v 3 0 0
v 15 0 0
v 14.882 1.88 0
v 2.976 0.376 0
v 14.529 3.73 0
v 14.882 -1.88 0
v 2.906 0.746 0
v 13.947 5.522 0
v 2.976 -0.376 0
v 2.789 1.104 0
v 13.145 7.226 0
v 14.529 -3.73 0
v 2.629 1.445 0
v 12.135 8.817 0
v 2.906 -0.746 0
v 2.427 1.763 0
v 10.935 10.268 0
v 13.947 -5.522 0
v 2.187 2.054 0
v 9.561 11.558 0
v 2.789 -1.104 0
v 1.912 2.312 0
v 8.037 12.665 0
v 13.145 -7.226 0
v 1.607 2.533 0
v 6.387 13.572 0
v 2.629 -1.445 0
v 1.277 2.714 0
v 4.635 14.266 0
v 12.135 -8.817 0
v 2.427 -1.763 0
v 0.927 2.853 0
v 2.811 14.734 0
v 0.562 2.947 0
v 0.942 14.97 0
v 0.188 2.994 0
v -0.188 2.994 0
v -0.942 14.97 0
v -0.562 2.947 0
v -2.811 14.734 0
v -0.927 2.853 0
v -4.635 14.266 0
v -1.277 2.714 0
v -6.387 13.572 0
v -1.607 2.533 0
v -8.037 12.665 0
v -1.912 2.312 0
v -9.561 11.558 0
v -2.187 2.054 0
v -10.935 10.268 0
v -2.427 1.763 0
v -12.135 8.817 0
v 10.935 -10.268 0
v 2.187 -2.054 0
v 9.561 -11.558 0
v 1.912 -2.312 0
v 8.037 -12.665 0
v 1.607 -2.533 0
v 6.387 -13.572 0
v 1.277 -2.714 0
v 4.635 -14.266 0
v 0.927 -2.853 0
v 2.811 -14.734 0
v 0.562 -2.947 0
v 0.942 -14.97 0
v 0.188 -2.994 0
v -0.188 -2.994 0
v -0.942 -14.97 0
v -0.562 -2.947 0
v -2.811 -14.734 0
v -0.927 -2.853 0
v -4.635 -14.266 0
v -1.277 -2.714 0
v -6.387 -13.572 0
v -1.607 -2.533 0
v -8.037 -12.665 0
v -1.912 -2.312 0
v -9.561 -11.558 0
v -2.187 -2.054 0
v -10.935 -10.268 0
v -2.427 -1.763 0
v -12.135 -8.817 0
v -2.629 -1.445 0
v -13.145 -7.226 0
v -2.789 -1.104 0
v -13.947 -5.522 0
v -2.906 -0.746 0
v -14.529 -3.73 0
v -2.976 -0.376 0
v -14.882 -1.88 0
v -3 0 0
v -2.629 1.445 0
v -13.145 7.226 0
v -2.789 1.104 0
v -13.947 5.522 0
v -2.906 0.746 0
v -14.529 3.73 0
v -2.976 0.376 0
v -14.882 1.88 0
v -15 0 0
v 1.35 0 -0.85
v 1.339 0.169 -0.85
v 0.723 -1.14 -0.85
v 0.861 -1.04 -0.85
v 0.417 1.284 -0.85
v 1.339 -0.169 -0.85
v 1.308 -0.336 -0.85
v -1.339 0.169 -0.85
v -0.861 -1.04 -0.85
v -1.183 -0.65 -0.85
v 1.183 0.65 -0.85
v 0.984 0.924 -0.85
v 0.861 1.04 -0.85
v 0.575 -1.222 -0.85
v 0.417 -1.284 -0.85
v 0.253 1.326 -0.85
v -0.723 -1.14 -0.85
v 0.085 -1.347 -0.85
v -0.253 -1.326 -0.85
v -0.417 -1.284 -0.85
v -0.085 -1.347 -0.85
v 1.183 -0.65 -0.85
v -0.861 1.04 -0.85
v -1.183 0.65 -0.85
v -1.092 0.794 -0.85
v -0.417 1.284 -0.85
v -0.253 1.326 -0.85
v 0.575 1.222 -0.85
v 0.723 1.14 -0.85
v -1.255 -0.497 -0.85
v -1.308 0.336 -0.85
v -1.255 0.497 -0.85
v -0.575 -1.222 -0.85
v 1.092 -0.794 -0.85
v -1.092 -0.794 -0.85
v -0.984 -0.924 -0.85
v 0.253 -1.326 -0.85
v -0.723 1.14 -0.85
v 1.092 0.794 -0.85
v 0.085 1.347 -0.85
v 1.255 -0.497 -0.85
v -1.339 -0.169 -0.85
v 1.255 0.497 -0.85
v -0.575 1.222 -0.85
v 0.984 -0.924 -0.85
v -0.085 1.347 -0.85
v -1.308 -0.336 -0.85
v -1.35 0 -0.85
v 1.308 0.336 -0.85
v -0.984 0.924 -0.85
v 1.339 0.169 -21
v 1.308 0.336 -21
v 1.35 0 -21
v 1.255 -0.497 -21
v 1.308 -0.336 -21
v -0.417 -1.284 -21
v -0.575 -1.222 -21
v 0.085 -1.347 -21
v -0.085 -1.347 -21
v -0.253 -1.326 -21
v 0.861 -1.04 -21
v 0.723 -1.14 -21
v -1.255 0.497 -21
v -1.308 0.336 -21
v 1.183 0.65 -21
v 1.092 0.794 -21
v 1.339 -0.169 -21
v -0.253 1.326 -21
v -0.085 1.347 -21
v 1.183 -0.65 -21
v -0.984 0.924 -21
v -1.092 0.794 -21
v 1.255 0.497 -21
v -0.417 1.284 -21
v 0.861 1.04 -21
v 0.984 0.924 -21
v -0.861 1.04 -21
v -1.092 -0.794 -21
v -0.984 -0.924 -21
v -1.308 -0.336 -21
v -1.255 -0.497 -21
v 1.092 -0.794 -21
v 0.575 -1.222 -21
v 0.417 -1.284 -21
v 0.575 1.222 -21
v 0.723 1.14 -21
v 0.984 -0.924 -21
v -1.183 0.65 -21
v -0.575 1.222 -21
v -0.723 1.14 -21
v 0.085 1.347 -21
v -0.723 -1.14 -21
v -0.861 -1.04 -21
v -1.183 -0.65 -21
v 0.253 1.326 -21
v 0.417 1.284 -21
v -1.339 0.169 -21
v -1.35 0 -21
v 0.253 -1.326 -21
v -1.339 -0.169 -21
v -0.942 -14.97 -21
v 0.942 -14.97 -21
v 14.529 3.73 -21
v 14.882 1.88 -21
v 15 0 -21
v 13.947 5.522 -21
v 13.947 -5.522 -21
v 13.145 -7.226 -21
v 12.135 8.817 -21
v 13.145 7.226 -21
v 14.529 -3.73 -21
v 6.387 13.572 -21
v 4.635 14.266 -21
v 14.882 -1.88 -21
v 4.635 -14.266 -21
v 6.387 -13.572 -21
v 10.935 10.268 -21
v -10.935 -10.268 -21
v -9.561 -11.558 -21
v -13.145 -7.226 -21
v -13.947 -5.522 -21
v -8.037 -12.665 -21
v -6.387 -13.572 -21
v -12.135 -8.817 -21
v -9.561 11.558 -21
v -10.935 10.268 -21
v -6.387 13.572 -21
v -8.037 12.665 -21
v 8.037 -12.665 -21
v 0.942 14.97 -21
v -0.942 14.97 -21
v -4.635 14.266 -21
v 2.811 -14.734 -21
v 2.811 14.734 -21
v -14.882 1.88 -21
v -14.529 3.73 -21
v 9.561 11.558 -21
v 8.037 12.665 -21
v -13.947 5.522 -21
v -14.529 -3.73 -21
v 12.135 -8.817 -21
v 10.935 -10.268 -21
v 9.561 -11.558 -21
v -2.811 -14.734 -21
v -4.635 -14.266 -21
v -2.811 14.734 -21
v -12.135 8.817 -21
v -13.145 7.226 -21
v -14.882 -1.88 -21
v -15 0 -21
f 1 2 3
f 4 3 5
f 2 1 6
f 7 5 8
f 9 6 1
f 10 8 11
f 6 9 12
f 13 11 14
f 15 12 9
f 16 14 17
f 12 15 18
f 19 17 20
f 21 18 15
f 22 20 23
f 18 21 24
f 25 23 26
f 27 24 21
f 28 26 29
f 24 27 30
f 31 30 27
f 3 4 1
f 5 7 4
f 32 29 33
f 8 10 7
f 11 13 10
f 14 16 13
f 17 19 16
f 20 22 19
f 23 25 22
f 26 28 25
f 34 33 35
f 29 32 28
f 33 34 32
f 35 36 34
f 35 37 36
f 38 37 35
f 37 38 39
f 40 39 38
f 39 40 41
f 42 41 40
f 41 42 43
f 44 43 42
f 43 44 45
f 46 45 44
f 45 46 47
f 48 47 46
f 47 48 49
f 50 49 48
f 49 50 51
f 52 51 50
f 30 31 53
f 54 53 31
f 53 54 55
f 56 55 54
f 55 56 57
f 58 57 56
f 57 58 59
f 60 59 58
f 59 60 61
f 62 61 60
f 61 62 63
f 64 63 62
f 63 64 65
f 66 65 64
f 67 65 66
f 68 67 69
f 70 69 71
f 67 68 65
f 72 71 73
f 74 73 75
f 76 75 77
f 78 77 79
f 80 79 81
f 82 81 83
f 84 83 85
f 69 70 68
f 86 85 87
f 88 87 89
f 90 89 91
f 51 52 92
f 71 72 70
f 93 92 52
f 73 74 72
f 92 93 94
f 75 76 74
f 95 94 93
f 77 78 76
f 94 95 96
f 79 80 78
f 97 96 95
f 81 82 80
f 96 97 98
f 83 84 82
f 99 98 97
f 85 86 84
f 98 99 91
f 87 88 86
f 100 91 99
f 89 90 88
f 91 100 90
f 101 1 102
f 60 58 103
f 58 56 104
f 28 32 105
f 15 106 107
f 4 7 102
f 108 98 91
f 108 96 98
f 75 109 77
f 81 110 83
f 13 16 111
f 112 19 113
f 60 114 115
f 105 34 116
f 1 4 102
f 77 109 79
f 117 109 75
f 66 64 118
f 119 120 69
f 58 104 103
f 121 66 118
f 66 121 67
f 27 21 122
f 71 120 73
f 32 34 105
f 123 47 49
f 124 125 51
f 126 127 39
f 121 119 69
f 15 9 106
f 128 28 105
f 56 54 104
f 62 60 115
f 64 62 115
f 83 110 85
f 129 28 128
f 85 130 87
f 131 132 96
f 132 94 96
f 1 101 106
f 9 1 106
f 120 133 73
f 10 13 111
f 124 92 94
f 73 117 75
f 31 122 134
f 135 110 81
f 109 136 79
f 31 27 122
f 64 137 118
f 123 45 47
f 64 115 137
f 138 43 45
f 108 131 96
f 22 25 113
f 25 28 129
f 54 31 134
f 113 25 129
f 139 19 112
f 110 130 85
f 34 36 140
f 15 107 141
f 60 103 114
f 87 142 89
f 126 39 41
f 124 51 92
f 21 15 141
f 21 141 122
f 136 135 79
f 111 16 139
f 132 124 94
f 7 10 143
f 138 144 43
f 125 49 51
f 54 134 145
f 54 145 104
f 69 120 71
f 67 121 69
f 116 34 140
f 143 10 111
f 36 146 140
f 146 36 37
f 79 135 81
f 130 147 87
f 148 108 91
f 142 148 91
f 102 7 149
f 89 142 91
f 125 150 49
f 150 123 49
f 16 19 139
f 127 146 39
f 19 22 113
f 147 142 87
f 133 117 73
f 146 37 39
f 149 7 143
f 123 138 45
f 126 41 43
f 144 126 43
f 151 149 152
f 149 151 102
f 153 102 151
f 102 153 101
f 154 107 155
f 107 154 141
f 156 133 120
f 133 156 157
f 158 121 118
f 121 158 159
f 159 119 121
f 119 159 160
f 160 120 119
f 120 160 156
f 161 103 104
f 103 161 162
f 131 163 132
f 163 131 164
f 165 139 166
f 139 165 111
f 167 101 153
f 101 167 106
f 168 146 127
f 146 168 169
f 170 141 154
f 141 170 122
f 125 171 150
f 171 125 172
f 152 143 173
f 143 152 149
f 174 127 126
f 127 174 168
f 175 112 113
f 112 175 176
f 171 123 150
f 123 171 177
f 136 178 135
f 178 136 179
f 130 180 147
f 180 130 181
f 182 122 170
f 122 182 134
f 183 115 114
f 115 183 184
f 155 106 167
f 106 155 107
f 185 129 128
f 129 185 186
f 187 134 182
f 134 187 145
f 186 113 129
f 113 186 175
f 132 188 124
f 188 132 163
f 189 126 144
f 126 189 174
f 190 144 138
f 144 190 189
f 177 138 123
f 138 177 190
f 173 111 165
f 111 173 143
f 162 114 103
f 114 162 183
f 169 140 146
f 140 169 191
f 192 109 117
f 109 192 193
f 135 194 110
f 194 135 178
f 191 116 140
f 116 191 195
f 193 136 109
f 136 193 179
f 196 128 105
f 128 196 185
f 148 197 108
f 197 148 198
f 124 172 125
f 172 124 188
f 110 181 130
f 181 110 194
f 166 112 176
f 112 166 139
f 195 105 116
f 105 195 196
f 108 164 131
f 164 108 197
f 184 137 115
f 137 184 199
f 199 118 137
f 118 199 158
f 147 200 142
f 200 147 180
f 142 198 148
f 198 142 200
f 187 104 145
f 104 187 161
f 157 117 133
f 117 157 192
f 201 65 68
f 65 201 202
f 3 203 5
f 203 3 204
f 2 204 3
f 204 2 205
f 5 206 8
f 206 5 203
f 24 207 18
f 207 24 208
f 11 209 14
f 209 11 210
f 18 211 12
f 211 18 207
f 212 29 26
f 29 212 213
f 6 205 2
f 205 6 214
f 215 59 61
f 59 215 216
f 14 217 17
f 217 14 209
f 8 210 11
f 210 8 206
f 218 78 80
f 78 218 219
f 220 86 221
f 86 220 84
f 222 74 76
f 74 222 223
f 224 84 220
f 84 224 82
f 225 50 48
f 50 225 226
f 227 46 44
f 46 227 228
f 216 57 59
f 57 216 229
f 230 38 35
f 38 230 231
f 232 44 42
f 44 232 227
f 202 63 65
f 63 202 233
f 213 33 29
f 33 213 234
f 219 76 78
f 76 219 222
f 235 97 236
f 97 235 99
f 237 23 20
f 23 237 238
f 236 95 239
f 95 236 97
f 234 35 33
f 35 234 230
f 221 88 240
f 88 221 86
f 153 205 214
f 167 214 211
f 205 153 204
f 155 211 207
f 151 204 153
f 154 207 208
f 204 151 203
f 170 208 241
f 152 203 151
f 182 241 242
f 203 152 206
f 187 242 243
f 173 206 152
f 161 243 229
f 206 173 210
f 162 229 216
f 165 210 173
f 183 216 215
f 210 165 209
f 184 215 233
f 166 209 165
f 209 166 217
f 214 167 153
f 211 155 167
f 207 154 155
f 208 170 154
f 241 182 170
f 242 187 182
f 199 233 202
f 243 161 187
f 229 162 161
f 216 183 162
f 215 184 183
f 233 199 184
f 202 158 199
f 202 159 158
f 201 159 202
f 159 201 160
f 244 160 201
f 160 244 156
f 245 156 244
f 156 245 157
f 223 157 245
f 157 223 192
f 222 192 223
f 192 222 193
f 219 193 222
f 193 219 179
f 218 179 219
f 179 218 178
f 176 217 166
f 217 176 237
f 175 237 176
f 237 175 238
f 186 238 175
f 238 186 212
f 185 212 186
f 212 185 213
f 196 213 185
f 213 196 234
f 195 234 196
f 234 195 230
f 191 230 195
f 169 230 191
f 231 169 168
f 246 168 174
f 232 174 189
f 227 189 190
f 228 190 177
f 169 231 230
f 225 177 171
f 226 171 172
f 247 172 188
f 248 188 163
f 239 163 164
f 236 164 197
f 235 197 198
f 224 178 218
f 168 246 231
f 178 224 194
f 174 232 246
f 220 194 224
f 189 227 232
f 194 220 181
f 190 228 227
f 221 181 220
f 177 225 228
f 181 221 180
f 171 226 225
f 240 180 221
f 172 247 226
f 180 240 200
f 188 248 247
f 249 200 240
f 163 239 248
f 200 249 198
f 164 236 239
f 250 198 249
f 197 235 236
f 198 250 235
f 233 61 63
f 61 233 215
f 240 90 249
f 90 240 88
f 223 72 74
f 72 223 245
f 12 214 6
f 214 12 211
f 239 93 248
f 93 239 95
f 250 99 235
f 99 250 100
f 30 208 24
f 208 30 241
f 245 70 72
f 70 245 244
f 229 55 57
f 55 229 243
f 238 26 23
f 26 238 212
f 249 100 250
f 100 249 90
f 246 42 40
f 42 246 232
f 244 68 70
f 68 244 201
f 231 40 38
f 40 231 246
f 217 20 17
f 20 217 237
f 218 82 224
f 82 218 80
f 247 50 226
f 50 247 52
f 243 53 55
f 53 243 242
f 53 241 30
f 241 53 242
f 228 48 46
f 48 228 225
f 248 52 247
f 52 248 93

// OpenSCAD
$fn = 50;

difference() {
	union() {
		translate(v = [0, 0, -21.0]) {
			cylinder(h = 21, r = 15.0);
		}
	}
	union() {
		translate(v = [0, 0, 0]) {
			rotate(a = [0, 0, 0]) {
				difference() {
					union() {
						translate(v = [0, 0, -24.0]) {
							cylinder(h = 24, r = 1.0);
						}
						translate(v = [0, 0, -0.85]) {
							cylinder(h = 0.85, r1 = 1.35, r2 = 3.0);
						}
						translate(v = [0, 0, -24.0]) {
							cylinder(h = 24, r = 1.35);
						}
						translate(v = [0, 0, -24.0]) {
							cylinder(h = 24, r = 1.0);
						}
					}
					union();
				}
			}
		}
	}
}
